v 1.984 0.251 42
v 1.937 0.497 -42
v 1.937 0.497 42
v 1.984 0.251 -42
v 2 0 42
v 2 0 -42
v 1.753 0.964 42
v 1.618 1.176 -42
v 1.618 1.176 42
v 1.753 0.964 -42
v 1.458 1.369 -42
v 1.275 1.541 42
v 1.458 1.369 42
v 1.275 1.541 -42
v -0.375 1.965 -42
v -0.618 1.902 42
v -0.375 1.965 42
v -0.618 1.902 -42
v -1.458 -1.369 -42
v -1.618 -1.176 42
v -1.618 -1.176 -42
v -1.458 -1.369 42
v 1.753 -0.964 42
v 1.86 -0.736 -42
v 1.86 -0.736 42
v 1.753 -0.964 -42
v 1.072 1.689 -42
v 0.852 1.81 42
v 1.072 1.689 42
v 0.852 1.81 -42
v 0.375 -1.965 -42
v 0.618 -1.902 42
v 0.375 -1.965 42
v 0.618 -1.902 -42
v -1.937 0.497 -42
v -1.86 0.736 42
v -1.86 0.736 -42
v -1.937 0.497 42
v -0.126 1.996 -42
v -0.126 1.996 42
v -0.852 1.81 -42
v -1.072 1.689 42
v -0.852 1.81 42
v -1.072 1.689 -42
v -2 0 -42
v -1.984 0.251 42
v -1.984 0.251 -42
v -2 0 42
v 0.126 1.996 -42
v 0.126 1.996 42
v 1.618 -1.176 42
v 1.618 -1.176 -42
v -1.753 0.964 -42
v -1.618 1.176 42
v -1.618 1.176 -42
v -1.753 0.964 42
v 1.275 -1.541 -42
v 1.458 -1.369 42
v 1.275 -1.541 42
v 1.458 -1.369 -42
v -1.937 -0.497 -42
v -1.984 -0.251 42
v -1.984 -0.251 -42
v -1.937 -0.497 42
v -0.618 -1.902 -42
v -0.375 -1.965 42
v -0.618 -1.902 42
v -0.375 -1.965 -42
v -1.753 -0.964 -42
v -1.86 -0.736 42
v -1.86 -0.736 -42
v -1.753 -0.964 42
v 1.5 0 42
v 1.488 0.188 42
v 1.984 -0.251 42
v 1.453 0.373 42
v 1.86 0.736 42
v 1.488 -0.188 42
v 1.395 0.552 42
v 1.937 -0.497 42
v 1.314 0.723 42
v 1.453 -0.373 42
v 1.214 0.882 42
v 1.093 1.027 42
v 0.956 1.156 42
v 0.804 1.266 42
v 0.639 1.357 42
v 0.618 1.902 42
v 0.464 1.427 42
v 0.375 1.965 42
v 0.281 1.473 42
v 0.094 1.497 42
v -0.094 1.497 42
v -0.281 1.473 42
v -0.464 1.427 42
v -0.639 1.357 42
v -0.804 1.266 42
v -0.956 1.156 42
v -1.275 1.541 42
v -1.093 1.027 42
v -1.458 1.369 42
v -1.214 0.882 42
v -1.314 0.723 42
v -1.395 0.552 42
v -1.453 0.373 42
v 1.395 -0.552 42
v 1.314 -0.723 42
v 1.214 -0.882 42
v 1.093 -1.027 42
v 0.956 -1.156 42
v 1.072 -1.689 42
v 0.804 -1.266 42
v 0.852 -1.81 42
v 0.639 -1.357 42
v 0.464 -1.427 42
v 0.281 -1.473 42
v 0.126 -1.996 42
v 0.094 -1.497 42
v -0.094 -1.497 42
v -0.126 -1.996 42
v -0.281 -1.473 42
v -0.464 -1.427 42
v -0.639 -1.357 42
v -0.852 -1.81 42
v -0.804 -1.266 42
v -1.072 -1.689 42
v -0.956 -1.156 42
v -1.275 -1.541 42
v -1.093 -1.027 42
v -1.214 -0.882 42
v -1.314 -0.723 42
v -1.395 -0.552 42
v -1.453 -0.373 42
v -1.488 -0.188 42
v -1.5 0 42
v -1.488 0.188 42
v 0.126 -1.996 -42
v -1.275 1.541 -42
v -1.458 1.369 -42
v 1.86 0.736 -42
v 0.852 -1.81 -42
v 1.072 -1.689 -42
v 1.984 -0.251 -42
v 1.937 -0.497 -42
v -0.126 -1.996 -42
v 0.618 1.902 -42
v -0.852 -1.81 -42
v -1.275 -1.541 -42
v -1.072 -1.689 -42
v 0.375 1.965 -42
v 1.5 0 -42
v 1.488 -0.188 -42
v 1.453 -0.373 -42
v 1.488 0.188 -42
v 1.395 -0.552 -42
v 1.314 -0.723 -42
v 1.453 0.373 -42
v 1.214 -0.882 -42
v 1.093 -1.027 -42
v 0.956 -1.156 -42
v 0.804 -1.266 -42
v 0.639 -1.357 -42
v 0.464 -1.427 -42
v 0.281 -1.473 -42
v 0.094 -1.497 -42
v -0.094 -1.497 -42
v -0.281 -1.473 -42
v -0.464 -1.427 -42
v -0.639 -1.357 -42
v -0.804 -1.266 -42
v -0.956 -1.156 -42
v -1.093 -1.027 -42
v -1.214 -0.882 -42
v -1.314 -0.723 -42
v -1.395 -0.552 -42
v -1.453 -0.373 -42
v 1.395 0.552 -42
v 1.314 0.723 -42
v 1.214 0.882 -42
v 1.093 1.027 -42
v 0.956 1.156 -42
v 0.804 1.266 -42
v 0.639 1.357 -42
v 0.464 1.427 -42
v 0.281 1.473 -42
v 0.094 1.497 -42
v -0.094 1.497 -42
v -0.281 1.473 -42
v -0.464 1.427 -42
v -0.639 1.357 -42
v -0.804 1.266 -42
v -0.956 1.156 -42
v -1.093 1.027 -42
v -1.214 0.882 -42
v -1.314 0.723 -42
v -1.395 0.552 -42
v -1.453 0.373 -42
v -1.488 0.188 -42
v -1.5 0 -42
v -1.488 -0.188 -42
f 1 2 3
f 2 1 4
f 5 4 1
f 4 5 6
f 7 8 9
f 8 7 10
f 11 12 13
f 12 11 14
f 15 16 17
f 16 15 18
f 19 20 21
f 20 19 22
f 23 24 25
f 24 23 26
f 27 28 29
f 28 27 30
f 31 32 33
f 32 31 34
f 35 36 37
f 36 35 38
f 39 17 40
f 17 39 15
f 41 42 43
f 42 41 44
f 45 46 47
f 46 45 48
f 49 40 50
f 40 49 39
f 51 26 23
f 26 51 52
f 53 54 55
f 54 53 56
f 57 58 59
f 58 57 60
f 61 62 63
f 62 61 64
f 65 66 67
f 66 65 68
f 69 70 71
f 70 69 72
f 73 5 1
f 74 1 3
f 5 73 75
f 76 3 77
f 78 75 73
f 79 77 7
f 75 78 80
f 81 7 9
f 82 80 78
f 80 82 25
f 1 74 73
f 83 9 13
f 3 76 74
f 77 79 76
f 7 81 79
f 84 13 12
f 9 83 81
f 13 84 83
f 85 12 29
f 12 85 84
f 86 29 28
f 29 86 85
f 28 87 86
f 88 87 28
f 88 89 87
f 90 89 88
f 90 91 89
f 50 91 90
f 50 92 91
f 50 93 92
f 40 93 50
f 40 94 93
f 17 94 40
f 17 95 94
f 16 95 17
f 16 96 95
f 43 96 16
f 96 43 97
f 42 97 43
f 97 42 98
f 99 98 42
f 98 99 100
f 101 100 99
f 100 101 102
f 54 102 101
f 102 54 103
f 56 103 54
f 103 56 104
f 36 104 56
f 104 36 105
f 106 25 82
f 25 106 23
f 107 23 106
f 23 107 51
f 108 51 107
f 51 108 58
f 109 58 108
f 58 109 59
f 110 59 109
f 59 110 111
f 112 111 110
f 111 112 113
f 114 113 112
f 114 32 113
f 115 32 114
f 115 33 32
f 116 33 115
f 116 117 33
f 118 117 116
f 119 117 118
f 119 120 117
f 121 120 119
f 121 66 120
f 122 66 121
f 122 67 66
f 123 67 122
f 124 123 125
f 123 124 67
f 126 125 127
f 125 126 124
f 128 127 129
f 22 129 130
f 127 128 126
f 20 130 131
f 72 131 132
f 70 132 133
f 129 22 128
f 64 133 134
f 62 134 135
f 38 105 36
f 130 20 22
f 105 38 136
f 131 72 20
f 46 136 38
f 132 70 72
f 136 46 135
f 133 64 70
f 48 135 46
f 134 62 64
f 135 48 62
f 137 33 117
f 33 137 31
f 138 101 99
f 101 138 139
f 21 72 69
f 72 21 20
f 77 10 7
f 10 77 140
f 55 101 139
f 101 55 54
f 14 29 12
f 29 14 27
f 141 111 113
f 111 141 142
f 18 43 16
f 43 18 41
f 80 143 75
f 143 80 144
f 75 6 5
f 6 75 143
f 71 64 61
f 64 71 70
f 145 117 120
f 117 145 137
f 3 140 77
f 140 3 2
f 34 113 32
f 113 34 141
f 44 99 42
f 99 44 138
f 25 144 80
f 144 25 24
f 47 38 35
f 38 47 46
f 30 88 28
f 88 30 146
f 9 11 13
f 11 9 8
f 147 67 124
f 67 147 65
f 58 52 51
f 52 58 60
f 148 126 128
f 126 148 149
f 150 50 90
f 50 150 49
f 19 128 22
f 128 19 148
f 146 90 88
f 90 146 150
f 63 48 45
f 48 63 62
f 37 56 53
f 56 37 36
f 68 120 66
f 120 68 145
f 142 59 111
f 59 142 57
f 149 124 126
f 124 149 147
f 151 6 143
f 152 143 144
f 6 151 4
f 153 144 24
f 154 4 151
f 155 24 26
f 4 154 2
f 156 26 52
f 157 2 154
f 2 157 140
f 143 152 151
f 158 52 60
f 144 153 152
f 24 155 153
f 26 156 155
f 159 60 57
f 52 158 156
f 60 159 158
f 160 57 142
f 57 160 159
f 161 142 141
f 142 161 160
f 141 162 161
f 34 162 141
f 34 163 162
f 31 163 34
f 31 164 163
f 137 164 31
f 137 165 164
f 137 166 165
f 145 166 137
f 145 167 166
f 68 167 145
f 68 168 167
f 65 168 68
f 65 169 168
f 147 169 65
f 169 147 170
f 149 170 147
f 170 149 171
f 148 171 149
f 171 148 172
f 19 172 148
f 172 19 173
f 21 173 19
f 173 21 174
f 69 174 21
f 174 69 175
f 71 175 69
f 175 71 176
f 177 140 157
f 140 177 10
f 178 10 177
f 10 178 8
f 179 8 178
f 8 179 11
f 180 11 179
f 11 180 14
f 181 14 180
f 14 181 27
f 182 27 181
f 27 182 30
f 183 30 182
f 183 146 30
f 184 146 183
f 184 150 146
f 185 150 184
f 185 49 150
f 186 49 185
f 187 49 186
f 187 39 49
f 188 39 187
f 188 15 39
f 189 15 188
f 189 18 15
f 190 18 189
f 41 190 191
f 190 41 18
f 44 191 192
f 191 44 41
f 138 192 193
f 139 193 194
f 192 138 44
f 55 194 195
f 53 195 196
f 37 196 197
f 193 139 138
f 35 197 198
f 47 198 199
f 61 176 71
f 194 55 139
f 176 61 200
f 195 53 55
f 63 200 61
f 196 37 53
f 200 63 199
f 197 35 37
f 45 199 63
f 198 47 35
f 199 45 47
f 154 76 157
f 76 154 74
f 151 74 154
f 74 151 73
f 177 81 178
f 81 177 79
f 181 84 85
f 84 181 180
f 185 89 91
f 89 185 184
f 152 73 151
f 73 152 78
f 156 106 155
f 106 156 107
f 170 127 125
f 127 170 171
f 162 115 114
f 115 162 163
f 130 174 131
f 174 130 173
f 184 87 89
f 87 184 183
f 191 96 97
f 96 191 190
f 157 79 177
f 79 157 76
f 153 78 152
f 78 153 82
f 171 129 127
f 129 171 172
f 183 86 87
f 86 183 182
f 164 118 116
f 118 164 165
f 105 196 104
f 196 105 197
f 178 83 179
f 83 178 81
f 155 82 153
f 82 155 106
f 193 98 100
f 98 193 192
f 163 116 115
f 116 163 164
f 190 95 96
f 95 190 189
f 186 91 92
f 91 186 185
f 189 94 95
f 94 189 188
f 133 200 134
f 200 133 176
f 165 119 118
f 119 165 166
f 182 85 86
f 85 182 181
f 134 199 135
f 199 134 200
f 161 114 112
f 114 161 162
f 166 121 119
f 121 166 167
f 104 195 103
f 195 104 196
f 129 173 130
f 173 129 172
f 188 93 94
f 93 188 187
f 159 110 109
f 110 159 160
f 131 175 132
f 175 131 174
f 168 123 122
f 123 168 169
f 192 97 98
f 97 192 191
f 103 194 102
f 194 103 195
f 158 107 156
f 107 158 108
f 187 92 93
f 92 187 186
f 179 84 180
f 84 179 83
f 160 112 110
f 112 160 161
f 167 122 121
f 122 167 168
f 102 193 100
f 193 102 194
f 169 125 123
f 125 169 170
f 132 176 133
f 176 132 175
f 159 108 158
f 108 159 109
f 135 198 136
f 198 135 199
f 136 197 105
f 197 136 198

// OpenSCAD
$fn = 50;


difference() {
	union() {
		translate(v = [0, 0, -42.0000000000]) {
			cylinder(h = 84, r = 2.0000000000);
		}
	}
	union() {
		translate(v = [0, 0, -100.0000000000]) {
			cylinder(h = 200, r = 1.5000000000);
		}
	}
}
